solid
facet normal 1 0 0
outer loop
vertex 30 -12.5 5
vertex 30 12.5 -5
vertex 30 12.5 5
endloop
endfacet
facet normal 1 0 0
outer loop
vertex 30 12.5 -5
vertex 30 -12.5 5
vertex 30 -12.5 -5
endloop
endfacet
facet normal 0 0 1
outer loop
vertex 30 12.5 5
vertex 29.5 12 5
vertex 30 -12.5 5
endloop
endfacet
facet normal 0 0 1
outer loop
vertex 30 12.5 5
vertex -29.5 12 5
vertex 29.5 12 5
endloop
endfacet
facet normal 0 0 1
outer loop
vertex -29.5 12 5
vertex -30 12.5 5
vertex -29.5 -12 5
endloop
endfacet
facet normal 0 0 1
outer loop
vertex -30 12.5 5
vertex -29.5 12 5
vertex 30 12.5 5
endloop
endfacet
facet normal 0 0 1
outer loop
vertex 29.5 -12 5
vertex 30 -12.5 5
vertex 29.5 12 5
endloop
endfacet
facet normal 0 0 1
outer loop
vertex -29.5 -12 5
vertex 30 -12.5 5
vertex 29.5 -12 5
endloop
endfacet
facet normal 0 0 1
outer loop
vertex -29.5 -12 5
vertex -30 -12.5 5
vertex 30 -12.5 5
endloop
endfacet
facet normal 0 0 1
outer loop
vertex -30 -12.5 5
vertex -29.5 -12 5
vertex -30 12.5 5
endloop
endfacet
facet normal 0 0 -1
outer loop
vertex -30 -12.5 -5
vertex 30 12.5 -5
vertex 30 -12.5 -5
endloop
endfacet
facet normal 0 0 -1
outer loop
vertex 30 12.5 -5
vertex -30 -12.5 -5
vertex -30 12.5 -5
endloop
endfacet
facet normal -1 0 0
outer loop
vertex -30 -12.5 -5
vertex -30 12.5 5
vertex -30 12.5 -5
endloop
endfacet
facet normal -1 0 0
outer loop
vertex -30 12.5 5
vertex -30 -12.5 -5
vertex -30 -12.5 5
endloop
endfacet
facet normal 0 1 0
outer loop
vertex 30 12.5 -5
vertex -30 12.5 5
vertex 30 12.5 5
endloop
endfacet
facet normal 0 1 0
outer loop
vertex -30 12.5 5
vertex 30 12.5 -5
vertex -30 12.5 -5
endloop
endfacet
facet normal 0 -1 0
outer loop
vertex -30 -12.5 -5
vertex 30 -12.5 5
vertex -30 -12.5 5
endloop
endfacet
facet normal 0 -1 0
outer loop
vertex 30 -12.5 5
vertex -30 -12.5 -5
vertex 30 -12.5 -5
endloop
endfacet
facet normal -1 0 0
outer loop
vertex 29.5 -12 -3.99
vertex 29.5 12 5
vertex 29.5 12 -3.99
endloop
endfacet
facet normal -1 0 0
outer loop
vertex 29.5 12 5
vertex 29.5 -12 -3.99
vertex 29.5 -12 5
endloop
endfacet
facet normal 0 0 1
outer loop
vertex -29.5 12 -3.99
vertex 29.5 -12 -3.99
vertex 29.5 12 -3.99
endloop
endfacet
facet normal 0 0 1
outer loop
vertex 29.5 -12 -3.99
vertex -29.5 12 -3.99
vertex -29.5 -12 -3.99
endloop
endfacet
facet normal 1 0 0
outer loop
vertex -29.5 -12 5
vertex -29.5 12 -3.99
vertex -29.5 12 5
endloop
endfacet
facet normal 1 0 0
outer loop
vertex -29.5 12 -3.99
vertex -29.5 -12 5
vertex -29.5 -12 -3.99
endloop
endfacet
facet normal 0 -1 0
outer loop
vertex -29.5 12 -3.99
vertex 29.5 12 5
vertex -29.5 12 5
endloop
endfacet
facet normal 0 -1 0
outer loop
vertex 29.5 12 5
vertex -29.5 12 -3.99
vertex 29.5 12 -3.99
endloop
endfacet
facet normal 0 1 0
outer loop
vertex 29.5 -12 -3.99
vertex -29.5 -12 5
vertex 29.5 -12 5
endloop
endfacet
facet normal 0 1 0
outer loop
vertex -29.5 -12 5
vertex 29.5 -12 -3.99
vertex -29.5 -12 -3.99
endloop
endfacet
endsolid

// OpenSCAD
// core vars

h=10; 
b=60;
t=25;
wt=0.5;
brt=4;
toplid=false;
box();

module box(){

	union(){
      if(toplid){
			translate([0,0,h/2+wt/2-0.01]){
				difference(){
			   	cube([b,t,wt],center=true);
				   cube([b-brt,t-brt*2,wt+0.1],center=true);
				}
			}
		}


		difference(){
		   cube([b,t,h],center=true);
		 
			translate([0,0,wt+0.01])
					cube([b-wt*2,t-wt*2,h-wt*2],center=true);

		}
	}
}
